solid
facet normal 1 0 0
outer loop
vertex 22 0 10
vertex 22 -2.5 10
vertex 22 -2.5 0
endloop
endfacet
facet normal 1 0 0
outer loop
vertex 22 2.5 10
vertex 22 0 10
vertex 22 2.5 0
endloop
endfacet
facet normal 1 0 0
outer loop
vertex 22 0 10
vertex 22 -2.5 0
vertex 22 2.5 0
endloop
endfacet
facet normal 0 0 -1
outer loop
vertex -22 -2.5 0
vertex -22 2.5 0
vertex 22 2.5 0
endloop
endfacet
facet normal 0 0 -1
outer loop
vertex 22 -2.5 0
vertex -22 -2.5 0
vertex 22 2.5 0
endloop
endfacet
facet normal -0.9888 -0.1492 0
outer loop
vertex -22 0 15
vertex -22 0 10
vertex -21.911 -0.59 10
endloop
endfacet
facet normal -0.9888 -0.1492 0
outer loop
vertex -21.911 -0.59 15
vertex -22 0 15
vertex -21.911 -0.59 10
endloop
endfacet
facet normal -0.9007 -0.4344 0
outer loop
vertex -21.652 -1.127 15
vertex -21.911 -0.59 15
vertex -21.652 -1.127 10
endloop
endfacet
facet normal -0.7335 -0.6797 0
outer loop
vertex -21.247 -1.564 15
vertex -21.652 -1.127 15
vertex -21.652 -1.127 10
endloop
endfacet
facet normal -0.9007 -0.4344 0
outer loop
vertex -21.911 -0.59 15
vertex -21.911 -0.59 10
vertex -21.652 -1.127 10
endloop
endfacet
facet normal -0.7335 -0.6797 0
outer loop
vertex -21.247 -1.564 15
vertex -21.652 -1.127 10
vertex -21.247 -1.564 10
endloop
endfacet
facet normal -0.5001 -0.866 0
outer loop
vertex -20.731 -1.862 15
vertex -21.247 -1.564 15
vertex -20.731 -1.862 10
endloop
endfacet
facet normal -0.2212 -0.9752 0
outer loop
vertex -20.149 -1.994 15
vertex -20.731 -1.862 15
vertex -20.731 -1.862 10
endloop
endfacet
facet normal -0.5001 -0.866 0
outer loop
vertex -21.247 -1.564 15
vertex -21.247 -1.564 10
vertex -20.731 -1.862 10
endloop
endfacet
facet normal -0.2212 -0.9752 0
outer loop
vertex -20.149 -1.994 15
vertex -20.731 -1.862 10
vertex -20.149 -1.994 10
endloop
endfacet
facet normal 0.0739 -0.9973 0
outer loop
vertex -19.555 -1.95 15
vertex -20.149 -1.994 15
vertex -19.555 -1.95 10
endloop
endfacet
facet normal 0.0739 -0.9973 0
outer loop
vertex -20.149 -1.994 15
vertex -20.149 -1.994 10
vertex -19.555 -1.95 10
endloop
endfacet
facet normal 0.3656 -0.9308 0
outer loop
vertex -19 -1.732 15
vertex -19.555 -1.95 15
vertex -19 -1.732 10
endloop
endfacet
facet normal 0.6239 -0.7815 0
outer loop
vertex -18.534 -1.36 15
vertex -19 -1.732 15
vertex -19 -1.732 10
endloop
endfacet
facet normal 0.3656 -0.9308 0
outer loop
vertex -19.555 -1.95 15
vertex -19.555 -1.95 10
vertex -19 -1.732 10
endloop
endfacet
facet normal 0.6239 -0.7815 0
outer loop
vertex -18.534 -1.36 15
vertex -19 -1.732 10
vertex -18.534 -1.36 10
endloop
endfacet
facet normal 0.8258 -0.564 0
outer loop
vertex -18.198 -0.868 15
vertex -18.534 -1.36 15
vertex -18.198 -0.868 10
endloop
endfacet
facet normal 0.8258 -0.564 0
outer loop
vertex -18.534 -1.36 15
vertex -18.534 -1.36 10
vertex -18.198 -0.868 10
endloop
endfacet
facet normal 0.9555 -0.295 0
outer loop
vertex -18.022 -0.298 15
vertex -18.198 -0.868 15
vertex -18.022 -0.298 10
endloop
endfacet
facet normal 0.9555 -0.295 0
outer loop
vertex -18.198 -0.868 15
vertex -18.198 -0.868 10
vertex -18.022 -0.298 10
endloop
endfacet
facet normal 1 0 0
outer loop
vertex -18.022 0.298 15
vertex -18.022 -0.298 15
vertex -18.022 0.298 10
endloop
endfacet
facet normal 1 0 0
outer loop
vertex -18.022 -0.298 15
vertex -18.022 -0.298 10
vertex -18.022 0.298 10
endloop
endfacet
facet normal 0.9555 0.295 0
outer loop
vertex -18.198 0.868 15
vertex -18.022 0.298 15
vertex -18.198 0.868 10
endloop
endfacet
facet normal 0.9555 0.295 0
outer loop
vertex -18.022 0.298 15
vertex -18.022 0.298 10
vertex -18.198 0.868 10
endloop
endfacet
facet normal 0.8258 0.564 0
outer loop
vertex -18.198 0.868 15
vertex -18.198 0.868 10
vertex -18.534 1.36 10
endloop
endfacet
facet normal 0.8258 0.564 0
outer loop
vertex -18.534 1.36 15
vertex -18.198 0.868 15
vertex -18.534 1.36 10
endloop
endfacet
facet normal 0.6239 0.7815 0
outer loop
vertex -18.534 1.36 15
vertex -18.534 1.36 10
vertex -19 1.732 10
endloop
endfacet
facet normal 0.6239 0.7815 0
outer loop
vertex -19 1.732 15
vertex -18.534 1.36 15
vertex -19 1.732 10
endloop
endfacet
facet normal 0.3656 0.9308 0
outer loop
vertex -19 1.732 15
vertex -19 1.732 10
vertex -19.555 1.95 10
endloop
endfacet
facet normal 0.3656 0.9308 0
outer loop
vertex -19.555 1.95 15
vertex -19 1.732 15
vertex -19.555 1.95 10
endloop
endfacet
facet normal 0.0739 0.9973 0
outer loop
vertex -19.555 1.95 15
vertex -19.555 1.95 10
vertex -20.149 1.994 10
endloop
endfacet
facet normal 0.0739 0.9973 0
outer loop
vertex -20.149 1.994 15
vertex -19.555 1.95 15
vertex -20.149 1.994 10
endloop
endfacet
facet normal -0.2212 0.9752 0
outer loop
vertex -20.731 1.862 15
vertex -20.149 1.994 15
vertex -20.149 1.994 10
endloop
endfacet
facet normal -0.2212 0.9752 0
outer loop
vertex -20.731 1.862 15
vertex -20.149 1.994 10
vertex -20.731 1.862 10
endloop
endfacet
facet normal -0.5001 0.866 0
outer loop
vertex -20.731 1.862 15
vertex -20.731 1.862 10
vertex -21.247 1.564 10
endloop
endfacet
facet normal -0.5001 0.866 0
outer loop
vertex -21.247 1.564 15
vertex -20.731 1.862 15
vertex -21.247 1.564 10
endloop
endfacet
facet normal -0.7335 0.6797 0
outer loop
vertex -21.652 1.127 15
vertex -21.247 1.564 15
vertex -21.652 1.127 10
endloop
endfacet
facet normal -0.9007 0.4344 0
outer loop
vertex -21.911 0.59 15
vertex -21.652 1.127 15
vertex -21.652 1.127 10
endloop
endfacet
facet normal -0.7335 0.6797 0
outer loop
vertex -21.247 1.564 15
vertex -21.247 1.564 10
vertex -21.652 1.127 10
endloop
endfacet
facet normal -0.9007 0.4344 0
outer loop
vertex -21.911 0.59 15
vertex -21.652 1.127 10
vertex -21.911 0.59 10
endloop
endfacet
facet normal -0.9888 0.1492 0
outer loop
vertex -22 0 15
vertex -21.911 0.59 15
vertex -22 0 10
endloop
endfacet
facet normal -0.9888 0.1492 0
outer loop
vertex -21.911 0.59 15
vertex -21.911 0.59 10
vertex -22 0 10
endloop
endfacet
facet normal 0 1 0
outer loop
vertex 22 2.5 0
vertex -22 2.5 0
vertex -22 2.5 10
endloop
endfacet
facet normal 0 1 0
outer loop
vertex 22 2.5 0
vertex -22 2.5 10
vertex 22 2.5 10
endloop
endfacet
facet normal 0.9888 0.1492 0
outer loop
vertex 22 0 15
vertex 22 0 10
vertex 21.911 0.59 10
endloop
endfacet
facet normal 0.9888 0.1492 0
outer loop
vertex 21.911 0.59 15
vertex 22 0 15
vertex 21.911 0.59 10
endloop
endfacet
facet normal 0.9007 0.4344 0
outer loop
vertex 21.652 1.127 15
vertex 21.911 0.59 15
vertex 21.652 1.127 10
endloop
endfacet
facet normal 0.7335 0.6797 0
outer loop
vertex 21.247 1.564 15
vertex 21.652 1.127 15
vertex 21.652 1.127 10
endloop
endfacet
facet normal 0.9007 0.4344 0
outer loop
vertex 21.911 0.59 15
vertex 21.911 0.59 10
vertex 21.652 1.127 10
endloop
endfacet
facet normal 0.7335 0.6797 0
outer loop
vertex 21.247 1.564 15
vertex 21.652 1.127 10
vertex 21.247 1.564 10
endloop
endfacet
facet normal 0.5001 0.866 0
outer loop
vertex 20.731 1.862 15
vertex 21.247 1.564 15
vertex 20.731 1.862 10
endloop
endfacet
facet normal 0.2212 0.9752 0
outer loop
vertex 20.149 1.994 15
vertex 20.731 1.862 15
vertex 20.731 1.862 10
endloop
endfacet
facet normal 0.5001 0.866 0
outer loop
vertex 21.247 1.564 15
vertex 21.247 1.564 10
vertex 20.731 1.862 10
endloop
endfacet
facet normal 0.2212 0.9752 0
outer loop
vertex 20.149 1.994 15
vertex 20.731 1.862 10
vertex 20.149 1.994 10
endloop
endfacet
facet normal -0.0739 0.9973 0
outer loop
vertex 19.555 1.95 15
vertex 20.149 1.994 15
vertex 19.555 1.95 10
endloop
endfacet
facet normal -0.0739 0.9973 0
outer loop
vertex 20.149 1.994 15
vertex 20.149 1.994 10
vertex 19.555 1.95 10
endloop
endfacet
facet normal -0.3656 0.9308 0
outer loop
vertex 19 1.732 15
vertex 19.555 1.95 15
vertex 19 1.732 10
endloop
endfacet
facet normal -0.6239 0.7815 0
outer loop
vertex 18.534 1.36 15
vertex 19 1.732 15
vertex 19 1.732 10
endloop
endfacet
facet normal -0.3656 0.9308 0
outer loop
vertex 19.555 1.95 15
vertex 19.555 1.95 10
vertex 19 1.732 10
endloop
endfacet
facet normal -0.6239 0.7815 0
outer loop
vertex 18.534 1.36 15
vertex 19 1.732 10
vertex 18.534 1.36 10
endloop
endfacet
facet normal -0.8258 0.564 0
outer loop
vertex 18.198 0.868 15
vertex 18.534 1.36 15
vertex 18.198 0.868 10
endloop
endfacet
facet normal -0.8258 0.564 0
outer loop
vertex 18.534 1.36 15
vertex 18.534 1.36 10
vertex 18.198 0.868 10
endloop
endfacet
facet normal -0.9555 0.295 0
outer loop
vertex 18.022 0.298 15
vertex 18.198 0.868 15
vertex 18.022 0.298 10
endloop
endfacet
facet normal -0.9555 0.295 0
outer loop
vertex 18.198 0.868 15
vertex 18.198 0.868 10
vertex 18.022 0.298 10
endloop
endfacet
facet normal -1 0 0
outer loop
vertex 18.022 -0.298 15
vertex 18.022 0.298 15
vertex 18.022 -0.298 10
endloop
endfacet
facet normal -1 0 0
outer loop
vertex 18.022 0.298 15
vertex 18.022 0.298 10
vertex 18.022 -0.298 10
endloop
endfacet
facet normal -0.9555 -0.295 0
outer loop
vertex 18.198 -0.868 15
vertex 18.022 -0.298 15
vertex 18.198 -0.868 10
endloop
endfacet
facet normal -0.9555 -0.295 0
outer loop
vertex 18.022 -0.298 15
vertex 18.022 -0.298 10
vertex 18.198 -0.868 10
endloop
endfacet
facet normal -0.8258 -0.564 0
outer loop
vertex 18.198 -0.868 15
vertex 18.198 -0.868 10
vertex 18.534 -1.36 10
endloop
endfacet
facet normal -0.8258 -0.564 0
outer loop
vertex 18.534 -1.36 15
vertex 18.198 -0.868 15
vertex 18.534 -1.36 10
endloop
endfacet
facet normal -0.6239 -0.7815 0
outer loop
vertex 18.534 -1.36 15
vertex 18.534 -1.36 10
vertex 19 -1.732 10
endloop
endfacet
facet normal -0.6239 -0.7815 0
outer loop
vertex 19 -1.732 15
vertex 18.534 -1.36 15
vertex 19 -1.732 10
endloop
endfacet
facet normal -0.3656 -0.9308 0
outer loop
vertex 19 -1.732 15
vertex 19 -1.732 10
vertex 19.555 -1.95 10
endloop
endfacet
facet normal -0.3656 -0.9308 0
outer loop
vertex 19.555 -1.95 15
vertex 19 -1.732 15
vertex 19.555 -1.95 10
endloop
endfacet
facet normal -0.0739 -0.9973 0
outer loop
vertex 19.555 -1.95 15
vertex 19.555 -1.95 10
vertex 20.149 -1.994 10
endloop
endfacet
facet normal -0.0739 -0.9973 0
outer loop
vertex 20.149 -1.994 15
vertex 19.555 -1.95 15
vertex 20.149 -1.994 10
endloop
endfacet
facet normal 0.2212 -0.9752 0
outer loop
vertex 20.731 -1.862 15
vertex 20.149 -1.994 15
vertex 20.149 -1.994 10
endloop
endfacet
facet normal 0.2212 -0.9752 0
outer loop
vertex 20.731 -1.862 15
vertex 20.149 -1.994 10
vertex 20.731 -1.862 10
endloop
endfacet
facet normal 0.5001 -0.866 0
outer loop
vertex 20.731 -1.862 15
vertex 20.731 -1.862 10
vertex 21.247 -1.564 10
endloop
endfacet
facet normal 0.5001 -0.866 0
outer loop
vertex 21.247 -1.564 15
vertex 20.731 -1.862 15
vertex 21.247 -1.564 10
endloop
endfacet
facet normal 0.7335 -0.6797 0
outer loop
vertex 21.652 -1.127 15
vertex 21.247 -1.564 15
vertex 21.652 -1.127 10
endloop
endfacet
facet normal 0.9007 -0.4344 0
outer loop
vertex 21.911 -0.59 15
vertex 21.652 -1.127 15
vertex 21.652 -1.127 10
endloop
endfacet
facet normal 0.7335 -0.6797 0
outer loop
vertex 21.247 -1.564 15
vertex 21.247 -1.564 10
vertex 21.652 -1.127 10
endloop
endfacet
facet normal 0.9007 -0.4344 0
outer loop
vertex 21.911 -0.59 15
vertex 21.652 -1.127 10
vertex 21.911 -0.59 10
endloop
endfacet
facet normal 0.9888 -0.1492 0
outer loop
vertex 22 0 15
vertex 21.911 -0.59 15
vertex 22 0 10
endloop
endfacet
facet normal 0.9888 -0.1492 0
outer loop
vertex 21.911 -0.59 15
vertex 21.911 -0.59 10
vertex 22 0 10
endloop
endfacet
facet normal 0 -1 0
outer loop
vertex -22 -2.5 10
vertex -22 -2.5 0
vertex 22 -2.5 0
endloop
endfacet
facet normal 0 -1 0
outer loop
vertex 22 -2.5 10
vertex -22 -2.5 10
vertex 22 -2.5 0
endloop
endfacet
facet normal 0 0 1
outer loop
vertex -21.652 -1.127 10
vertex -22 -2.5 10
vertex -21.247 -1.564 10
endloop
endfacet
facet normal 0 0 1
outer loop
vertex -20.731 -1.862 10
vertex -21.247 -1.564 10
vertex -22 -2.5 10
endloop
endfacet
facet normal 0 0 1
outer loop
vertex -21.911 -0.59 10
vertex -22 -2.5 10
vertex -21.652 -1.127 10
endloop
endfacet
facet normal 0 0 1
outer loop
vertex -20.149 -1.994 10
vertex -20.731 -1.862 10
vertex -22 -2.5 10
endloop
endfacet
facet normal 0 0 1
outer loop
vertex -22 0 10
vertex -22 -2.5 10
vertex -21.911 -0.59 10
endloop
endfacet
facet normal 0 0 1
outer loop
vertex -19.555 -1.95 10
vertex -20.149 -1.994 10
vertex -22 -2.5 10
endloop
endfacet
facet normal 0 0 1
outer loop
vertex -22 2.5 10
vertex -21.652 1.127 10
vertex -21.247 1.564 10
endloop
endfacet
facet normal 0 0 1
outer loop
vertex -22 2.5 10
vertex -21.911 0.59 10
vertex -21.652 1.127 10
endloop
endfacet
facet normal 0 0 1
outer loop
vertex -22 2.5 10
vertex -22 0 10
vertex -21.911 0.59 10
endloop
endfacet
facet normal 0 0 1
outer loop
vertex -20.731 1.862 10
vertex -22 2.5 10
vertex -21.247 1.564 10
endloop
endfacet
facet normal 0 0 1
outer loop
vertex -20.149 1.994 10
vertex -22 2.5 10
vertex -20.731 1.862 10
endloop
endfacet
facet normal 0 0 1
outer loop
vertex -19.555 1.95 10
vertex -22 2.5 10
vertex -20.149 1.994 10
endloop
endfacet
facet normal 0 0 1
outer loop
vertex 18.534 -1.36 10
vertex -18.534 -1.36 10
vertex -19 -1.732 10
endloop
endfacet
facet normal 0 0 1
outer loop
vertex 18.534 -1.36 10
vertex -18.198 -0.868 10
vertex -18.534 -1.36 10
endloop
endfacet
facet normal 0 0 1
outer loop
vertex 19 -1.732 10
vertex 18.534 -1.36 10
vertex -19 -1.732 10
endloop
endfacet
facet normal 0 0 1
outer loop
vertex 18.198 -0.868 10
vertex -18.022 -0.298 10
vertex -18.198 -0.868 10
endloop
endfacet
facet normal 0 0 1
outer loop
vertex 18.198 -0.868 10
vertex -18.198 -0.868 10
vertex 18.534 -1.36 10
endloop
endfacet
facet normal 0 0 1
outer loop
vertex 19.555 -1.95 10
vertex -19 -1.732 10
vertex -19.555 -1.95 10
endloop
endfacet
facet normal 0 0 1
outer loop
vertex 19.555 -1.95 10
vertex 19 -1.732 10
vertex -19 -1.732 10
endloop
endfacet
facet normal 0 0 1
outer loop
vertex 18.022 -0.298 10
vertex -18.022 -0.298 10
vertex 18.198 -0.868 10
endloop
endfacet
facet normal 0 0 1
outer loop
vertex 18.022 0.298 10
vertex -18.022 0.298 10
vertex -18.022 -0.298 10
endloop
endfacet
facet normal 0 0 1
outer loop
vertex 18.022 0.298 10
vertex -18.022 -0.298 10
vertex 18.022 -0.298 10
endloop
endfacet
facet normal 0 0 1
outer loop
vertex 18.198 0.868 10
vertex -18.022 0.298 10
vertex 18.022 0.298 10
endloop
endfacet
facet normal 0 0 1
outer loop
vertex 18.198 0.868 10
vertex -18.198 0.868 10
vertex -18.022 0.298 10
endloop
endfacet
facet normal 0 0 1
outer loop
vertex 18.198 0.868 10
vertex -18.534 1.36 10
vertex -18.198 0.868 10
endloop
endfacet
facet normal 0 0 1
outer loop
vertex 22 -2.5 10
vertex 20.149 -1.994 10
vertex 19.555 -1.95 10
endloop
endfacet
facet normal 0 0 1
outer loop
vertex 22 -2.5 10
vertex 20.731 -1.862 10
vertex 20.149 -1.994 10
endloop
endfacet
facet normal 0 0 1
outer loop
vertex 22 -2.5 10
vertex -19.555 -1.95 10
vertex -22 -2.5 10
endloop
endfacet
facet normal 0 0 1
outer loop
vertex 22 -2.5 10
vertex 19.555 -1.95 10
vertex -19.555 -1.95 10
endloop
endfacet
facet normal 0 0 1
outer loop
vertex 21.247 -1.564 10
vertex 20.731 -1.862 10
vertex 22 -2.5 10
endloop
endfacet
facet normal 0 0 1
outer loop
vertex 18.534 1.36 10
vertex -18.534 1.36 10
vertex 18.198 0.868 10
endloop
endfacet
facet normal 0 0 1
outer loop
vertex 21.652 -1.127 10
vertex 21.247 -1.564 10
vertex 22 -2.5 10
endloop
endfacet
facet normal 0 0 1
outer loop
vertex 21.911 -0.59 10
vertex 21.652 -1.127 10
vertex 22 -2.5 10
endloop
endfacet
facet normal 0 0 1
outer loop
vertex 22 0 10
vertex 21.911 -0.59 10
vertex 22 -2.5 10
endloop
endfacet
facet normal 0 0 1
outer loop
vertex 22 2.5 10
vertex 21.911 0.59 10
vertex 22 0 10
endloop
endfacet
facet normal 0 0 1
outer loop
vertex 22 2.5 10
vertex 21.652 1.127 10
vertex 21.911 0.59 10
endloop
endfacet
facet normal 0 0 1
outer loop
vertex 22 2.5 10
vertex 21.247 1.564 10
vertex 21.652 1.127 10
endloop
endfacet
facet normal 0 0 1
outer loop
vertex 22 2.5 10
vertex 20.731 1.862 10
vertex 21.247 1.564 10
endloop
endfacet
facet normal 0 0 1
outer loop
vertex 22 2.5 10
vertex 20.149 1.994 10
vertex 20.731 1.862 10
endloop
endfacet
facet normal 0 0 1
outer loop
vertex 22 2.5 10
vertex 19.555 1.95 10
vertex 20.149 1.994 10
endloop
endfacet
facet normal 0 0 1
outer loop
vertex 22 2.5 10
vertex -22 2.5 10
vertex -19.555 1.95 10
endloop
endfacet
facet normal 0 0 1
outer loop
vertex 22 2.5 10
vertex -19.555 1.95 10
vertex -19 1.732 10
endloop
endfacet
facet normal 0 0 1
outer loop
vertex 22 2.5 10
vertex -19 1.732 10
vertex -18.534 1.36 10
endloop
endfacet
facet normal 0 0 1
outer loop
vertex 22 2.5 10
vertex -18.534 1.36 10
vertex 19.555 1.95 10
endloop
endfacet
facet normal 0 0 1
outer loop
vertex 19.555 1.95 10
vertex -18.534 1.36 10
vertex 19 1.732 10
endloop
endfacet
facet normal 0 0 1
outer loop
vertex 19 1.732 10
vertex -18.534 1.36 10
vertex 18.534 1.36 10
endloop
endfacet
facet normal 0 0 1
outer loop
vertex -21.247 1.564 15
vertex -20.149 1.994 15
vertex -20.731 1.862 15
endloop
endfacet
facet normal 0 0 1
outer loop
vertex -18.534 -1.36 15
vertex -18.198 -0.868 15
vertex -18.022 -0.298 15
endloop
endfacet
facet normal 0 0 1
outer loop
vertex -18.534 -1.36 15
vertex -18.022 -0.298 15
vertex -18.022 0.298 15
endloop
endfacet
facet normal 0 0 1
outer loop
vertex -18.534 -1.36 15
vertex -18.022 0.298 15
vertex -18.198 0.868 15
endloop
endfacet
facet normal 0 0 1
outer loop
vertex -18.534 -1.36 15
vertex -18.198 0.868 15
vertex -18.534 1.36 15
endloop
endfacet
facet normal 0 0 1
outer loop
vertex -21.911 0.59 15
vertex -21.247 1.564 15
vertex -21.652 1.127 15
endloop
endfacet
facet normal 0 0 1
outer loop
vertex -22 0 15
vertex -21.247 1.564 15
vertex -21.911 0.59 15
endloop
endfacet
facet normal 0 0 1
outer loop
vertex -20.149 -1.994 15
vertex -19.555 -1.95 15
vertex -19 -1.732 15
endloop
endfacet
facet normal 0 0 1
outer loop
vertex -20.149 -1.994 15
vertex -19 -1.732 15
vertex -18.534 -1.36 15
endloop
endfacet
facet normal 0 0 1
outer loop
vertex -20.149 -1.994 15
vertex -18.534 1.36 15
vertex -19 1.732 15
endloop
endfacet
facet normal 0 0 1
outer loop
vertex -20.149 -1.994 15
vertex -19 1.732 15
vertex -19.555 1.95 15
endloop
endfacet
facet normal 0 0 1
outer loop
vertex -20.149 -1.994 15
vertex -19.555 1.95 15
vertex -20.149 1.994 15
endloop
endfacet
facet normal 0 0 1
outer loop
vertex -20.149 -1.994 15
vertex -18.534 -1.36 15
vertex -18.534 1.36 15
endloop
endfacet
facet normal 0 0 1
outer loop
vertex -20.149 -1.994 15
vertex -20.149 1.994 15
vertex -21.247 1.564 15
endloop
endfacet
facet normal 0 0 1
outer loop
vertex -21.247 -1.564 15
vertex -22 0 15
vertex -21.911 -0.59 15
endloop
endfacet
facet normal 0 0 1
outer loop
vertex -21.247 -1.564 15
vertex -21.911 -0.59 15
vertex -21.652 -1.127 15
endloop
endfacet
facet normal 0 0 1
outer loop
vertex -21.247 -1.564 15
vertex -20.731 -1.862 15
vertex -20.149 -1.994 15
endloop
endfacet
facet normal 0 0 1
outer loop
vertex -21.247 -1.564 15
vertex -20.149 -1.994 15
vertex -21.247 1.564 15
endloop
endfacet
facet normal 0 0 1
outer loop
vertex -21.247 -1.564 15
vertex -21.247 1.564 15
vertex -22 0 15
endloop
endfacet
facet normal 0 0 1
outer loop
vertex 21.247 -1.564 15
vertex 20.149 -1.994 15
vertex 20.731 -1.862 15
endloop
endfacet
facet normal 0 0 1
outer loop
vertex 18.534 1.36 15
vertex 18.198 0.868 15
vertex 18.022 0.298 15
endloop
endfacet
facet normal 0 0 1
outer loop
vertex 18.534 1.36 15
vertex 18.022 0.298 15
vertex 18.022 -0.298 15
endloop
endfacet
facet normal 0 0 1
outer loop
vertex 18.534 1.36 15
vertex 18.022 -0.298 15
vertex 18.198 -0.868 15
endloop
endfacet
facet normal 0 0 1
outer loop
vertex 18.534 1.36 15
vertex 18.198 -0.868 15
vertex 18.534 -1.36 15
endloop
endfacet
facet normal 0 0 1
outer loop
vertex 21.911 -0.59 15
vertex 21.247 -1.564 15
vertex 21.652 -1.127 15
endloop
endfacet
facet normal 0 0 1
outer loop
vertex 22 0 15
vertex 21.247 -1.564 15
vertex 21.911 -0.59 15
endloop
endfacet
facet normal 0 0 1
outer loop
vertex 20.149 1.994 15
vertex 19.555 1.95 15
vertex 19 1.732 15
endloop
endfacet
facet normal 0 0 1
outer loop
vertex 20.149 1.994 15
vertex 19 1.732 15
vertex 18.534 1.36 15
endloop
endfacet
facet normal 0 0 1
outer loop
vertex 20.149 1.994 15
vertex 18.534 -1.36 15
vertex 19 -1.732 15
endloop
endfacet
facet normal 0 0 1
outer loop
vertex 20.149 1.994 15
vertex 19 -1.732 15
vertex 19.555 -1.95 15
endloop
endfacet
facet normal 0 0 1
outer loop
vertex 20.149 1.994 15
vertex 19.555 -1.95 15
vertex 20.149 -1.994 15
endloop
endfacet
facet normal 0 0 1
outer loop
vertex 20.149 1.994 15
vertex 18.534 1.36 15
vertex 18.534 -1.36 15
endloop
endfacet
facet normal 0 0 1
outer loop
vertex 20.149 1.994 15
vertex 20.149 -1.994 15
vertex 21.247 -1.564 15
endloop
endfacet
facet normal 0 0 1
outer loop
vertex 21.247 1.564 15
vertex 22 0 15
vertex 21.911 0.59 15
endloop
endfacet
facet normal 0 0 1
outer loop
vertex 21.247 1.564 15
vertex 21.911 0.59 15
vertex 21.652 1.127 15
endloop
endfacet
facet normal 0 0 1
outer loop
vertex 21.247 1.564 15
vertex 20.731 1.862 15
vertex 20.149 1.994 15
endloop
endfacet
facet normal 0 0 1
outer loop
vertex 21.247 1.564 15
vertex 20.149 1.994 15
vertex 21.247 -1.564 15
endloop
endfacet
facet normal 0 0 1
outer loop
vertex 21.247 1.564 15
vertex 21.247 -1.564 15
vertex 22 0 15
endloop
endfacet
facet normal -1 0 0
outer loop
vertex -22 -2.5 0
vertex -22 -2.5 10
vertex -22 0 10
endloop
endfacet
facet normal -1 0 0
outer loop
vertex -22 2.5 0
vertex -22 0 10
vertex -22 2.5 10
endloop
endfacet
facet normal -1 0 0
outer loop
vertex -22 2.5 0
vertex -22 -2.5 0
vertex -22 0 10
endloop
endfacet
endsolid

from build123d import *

# Parameters (mm, degrees)
CROQUIS1_W              = 44
CROQUIS1_H              = 5
SALIENTE_EXTRUIR1_DEPTH = 10
CROQUIS2_R              = 2
SALIENTE_EXTRUIR2_DEPTH = 5


with BuildPart() as part:
    # Croquis1 → Saliente-Extruir1 (new body)
    with BuildSketch(Plane.XY):
        Rectangle(CROQUIS1_W, CROQUIS1_H)
    extrude(amount=SALIENTE_EXTRUIR1_DEPTH)

    # Croquis2 → Saliente-Extruir2 (add)
    with BuildSketch(Plane.XY.offset(10)):
        with Locations(Location((-20, 0, 0), (0, 0, 180))):
            Circle(CROQUIS2_R)
        with Locations((20, 0)):
            Circle(CROQUIS2_R)
    extrude(amount=SALIENTE_EXTRUIR2_DEPTH)


solid = part.part
